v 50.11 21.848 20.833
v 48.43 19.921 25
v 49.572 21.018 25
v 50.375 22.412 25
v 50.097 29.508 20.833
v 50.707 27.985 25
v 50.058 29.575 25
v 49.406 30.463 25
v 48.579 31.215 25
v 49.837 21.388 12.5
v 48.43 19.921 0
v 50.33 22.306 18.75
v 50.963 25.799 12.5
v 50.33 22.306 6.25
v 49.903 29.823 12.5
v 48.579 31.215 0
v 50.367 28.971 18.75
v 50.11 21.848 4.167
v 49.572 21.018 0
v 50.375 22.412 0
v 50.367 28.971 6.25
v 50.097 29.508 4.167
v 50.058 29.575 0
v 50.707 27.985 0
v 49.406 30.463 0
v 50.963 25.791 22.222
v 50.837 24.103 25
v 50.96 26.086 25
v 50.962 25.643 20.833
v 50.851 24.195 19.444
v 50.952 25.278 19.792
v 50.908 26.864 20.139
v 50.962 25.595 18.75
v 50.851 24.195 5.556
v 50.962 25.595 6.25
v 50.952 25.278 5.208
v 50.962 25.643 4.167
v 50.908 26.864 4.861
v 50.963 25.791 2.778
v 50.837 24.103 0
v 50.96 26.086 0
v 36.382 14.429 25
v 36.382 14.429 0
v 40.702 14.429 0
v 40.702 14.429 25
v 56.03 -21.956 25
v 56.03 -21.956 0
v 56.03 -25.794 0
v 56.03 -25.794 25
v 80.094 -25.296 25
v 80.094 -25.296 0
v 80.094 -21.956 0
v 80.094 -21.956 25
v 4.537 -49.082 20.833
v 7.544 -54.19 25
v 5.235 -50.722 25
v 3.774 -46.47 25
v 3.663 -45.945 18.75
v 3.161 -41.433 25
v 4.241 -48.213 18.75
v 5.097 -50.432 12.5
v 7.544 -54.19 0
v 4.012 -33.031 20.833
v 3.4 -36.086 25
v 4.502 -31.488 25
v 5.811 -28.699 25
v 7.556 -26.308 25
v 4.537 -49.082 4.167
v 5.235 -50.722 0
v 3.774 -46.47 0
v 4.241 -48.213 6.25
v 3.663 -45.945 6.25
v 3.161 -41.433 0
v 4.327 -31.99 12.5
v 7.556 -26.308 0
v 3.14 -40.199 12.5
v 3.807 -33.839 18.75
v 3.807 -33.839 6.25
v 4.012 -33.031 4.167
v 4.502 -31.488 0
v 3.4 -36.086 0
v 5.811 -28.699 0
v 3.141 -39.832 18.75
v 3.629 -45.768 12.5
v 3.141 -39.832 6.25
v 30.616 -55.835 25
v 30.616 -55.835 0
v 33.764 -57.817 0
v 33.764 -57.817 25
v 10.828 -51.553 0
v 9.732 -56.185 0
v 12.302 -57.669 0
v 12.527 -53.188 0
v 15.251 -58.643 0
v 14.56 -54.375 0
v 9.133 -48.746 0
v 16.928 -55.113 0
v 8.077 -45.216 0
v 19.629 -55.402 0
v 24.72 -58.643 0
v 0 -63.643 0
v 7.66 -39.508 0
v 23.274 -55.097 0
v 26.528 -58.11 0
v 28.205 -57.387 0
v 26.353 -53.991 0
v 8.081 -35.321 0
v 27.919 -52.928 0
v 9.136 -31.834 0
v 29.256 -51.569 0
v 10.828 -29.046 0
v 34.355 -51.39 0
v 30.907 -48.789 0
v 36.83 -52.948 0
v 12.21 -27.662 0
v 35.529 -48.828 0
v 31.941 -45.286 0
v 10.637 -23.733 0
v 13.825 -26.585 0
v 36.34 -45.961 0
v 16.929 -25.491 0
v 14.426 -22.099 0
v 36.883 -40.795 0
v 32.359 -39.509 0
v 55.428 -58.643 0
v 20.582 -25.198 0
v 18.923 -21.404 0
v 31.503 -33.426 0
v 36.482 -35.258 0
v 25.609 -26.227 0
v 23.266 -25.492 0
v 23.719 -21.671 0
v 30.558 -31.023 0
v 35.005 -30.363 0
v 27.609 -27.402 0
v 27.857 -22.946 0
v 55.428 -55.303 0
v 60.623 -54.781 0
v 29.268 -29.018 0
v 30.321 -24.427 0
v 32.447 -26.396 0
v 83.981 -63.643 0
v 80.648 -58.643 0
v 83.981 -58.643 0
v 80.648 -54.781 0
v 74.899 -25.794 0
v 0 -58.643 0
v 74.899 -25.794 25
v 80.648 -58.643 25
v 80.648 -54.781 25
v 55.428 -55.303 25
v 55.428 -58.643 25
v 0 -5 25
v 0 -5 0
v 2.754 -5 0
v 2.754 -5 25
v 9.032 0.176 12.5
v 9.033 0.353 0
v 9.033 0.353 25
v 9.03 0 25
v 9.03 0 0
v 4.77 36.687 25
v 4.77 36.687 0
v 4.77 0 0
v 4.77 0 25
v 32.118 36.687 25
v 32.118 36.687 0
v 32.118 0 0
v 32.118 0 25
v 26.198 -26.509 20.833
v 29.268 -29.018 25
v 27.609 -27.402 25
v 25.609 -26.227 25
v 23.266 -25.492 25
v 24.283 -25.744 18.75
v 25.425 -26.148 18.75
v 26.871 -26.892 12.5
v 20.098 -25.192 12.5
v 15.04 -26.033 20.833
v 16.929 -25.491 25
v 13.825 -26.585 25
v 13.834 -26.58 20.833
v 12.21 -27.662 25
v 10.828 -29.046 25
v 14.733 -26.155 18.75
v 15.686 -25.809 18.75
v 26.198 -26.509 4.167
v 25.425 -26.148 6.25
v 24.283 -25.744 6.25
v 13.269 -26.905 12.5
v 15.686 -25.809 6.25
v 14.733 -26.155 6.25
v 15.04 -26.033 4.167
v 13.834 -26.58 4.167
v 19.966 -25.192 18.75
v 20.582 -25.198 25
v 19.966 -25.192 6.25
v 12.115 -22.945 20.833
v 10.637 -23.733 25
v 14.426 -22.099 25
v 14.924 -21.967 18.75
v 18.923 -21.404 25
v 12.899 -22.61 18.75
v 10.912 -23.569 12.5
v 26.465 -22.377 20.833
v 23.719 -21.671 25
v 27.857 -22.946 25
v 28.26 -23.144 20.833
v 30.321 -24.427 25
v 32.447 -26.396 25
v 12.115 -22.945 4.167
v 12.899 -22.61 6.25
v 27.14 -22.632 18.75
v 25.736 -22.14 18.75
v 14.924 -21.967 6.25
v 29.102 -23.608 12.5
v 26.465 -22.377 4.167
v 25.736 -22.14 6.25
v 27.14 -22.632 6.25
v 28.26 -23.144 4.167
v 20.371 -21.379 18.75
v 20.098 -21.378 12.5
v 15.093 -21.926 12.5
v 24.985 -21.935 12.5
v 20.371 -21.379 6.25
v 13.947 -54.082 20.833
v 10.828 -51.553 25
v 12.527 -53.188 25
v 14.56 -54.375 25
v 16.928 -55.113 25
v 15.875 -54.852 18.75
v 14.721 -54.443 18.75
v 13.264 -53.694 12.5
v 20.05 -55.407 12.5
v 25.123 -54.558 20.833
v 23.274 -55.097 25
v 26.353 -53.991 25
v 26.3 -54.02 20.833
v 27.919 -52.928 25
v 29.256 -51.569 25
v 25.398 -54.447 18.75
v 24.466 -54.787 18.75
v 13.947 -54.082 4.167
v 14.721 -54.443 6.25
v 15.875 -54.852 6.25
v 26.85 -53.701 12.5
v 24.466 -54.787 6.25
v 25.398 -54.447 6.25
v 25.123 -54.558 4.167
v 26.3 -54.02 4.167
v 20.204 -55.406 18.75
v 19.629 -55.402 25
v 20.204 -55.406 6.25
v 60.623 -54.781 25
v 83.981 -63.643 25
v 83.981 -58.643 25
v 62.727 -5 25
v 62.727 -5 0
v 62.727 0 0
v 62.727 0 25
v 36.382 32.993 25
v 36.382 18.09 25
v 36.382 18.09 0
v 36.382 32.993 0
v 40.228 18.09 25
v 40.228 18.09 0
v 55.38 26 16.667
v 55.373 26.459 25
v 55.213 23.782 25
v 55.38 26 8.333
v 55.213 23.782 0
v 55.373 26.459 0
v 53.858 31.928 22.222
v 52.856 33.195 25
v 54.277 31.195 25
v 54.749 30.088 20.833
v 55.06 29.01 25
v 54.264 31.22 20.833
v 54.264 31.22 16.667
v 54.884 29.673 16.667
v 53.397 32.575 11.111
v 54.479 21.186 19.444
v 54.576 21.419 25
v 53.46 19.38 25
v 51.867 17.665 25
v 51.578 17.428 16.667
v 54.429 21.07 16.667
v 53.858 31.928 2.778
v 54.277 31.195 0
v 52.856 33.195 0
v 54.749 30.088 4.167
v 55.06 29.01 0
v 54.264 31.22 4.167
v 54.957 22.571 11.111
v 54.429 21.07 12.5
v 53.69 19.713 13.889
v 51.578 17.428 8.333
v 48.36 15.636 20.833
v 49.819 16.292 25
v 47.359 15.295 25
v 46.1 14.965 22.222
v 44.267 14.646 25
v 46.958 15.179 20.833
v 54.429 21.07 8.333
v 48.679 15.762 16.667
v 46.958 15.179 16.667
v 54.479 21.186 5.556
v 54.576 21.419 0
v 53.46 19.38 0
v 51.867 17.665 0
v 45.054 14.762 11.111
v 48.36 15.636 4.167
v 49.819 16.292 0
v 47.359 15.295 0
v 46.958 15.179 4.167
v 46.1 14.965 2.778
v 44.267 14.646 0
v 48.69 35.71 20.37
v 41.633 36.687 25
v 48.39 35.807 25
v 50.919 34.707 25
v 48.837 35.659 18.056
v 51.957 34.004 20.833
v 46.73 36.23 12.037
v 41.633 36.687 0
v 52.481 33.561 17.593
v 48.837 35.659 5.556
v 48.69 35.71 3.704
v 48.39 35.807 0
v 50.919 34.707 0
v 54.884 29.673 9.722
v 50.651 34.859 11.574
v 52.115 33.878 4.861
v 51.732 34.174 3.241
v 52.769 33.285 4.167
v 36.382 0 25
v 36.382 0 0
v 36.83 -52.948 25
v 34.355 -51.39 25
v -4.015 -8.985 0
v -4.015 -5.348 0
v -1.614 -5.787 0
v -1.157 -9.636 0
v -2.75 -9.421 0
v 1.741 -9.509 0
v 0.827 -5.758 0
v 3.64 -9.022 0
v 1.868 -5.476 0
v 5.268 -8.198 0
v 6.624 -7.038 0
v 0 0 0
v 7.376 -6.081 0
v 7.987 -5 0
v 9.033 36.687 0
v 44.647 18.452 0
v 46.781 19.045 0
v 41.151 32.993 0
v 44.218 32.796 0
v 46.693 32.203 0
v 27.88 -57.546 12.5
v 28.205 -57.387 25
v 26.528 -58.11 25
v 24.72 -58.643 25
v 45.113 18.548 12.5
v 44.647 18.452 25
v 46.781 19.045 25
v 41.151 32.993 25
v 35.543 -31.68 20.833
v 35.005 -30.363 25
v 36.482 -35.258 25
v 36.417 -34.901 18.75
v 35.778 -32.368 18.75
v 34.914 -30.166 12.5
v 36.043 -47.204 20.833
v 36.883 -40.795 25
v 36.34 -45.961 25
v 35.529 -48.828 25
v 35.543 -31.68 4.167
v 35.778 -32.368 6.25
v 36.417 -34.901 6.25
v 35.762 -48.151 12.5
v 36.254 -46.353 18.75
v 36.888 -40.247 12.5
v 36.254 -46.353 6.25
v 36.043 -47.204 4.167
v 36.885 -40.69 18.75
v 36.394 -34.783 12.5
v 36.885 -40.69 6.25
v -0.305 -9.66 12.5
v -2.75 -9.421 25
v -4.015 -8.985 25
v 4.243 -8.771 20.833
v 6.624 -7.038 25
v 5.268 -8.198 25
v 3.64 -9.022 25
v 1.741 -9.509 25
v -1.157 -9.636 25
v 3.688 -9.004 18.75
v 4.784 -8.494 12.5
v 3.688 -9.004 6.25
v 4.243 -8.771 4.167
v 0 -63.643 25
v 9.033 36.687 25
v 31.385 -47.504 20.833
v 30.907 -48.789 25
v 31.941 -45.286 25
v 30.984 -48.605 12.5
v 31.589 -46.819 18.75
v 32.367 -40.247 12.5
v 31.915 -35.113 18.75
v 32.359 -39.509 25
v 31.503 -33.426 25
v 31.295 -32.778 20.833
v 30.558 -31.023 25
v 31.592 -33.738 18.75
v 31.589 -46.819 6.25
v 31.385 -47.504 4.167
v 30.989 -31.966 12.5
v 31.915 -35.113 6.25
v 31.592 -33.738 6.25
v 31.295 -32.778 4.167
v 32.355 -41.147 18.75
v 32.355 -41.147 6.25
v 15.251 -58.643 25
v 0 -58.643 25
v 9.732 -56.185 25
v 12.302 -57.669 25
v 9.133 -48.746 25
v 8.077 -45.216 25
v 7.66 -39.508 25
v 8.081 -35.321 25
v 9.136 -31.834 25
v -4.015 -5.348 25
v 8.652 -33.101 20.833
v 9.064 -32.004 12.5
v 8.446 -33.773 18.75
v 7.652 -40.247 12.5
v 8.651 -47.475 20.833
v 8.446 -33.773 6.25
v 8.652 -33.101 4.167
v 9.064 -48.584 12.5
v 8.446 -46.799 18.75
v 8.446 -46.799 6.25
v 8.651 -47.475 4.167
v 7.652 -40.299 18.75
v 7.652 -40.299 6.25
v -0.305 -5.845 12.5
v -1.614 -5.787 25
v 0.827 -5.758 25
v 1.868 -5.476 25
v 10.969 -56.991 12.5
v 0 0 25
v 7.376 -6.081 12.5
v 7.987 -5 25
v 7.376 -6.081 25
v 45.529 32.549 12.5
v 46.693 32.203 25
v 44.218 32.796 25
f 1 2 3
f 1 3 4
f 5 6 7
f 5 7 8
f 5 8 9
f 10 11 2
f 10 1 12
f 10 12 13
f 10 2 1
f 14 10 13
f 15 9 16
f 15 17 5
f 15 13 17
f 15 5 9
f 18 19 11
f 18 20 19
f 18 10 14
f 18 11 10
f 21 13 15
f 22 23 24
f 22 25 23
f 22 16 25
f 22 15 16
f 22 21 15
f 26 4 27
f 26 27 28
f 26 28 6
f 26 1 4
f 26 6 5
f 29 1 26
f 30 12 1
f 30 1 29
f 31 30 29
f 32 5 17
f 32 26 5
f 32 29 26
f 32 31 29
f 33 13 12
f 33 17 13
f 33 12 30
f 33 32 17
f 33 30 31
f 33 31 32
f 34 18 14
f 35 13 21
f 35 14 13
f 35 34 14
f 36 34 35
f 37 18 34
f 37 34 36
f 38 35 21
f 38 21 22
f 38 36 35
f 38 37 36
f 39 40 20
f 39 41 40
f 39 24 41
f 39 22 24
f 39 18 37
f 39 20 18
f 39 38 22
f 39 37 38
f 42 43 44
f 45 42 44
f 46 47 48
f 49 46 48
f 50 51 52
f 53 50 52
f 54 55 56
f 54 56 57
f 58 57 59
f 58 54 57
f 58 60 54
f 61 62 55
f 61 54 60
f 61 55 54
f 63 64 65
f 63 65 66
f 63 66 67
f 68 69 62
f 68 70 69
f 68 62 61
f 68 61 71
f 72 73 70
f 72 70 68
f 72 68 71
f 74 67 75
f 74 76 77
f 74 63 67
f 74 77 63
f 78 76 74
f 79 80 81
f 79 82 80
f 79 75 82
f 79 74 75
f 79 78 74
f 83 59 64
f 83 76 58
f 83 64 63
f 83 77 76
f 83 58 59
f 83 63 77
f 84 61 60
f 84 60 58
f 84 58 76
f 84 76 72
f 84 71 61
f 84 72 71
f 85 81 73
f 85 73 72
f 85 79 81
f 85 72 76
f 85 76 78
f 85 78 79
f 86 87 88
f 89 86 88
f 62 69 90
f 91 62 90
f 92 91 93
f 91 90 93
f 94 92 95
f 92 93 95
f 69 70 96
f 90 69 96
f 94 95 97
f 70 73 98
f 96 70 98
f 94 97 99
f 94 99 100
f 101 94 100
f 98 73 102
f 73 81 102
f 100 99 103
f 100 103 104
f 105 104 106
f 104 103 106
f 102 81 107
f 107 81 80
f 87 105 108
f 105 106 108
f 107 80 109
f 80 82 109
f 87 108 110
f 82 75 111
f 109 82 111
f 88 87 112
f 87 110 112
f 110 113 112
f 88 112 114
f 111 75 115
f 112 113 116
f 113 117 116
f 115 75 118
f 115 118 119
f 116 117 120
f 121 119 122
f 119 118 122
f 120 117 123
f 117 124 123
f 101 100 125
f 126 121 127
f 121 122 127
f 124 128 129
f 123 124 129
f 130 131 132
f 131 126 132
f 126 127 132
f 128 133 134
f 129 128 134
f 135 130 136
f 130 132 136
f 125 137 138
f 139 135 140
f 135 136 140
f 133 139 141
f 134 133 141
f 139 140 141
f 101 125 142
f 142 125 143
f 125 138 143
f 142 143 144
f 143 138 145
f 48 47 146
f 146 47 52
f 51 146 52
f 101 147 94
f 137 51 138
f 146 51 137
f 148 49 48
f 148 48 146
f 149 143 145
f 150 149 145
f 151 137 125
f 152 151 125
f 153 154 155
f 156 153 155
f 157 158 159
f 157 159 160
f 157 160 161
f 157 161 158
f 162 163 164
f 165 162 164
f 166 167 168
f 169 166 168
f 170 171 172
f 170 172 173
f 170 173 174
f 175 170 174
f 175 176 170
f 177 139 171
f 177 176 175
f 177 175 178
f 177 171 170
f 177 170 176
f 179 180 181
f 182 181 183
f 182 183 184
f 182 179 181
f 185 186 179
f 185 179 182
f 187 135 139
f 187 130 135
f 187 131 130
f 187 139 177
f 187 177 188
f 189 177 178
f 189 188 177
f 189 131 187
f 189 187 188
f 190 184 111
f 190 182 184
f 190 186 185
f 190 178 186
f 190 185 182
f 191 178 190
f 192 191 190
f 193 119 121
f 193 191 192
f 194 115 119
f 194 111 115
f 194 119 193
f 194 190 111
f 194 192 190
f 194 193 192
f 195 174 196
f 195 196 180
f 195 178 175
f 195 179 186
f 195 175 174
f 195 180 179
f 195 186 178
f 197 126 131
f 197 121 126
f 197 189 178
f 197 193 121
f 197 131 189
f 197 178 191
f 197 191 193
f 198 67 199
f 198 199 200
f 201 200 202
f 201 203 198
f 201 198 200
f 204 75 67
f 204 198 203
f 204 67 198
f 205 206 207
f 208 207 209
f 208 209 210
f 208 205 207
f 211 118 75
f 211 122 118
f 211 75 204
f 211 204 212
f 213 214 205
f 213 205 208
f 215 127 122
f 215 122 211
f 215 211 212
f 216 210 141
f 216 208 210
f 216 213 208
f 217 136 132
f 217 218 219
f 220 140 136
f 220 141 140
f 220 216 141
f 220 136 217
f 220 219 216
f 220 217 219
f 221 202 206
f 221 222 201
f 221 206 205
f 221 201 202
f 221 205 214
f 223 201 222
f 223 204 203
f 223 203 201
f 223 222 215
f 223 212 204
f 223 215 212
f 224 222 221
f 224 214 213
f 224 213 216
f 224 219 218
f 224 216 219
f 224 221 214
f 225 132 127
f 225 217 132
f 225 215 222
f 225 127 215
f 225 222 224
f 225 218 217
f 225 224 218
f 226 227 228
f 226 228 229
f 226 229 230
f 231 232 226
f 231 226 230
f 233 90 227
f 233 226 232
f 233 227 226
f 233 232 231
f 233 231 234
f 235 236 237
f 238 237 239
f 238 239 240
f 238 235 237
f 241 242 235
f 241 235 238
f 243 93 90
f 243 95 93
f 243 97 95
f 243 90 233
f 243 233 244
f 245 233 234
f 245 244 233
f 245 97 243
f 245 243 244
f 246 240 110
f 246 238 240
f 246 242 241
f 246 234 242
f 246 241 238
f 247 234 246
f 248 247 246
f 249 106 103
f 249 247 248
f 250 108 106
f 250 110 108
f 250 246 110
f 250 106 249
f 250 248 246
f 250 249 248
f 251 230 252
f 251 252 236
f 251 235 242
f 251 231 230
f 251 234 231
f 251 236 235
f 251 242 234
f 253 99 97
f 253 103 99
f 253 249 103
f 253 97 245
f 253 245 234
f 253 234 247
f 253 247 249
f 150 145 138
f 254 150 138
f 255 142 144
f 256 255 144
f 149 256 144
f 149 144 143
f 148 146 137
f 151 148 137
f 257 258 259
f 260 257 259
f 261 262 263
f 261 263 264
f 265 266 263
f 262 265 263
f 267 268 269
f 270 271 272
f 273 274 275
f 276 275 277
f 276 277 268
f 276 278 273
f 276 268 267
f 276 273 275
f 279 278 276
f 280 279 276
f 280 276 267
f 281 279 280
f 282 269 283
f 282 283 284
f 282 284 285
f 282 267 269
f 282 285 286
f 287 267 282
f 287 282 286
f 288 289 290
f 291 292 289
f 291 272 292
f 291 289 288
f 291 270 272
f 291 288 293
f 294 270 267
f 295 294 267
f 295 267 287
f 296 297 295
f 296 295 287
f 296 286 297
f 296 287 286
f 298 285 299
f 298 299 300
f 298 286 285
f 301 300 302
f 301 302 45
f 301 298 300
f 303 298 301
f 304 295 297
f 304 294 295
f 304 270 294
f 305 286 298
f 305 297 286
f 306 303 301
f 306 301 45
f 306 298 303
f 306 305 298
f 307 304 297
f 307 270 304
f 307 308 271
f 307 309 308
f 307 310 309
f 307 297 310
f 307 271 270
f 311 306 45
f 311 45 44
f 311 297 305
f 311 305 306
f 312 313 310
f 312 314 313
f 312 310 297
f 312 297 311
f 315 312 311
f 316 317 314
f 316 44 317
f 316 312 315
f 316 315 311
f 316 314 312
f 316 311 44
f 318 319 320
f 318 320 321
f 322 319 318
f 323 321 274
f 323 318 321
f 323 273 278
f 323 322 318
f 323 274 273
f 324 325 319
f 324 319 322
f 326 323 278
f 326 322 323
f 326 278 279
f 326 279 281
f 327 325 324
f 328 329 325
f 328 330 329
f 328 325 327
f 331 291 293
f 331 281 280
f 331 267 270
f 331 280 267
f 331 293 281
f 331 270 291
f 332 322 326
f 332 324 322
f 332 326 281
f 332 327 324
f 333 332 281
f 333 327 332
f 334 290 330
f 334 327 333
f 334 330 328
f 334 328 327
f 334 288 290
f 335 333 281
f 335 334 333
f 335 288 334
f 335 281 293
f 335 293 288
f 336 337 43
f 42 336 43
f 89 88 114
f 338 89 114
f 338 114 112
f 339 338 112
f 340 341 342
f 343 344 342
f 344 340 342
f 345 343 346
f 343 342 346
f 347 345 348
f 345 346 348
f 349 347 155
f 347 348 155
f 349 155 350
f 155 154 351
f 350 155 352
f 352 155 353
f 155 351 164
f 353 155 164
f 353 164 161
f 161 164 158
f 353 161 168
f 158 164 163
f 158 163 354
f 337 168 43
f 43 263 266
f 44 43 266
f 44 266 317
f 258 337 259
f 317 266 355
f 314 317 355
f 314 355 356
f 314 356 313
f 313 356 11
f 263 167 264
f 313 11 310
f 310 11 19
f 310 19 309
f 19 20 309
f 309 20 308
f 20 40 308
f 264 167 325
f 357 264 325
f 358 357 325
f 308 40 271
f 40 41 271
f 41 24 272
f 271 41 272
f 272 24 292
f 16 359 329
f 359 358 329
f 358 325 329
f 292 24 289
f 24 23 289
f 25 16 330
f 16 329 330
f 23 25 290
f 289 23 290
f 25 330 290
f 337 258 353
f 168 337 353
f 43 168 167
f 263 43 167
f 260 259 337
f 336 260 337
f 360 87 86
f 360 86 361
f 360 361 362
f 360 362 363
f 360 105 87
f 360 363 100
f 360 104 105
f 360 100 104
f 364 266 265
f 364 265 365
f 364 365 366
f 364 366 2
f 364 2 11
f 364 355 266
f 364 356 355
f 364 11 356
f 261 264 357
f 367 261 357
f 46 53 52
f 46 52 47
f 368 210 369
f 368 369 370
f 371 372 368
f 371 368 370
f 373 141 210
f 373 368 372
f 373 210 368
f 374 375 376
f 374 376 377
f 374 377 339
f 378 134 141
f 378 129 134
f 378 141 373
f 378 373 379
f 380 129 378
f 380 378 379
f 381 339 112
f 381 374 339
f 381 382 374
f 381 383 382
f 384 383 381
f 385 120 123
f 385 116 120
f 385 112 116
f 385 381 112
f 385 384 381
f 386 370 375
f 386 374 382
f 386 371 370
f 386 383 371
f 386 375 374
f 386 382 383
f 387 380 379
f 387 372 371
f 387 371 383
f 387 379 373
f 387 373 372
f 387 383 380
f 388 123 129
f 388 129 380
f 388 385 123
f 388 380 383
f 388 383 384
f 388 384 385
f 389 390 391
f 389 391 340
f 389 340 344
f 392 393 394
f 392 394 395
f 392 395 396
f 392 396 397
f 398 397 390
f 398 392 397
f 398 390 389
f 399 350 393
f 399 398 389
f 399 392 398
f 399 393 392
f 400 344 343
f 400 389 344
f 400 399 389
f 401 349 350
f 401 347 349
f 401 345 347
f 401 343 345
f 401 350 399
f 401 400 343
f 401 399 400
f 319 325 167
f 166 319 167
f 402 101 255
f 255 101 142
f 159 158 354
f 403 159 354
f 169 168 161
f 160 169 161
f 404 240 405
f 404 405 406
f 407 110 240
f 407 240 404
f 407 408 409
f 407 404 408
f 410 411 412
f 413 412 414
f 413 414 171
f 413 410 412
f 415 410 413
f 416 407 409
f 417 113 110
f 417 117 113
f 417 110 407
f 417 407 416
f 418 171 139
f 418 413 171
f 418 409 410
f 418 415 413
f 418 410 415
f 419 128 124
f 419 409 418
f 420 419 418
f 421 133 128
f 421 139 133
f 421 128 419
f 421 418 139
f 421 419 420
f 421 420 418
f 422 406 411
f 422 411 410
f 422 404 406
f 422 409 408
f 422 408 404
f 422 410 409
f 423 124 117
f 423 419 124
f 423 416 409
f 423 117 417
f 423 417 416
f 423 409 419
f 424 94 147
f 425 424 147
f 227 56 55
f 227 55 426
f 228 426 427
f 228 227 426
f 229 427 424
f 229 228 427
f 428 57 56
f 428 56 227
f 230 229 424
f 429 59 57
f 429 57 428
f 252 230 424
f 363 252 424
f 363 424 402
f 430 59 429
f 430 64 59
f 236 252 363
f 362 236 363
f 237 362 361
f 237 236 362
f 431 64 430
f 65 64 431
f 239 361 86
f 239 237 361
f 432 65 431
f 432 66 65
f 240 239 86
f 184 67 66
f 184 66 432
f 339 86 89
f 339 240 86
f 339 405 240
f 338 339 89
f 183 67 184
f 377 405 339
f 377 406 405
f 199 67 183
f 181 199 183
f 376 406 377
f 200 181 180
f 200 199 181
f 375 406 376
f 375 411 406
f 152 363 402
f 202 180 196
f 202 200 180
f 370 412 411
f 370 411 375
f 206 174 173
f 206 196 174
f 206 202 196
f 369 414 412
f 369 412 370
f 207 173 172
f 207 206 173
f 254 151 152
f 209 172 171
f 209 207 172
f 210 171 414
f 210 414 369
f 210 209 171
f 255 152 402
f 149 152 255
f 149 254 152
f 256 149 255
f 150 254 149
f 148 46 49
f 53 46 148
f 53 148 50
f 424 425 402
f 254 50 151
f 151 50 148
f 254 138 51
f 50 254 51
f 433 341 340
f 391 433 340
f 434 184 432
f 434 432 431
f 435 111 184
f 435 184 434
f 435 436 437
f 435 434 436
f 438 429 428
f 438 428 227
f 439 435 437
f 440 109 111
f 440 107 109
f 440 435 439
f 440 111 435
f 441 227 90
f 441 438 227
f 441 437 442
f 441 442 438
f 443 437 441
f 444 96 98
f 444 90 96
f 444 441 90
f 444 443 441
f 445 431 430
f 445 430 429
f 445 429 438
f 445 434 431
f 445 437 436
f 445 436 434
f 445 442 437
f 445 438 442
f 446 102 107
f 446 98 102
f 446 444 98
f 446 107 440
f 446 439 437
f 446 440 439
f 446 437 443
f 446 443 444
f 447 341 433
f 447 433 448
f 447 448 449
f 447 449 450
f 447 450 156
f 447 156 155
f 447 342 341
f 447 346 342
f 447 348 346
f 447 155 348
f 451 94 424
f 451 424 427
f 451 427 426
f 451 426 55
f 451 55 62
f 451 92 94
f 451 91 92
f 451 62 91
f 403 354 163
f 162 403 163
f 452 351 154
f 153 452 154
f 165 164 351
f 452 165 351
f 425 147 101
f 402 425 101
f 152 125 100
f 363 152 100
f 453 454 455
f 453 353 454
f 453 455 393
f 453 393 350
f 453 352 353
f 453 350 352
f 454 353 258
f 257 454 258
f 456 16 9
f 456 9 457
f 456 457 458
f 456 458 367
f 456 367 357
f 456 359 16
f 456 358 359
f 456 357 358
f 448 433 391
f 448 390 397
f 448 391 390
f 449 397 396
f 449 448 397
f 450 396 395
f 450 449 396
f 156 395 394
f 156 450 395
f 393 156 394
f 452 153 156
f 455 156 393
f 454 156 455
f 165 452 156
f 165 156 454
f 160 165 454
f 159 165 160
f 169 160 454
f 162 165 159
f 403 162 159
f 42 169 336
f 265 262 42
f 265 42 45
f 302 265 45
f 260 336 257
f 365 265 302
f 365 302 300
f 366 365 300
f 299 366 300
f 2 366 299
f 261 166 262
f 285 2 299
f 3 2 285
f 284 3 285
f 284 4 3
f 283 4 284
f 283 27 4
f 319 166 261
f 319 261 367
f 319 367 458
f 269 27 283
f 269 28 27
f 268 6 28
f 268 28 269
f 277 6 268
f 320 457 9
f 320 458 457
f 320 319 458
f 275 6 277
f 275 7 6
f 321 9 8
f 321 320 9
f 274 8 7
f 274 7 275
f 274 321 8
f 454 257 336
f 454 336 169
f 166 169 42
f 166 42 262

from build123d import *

# Parameters (mm, degrees)
F1_DEPTH = 25


with BuildPart() as f1:
    # F0 (on Top) → F1 (new body)
    with BuildSketch(Plane.XY):
        with BuildLine():
            Line((4.76953125, 0), (0, 0))
            Line((0, 0), (0, -5))
            Line((0, -5), (2.7536867479, -5))
            add(Edge.make_bspline(
                [(2.7536867479, -5), (3.1528031854, -4.7172538817), (3.4767795139, -4.3399522569)],
                knots=[0.7493901424, 0.7493901424, 0.7493901424, 1, 1, 1], degree=2))
            add(Edge.make_bspline(
                [(3.4767795139, -4.3399522569), (4.76953125, -2.8344184028), (4.76953125, 0)],
                knots=[0, 0, 0, 1, 1, 1], degree=2))
        make_face()
        with BuildLine():
            Line((4.76953125, 36.6868489583), (4.76953125, 0))
            Line((4.76953125, 0), (9.0298425084, 0))
            add(Edge.make_bspline(
                [(9.033203125, 0.3532986111), (9.033203125, 0.1751510307), (9.0298425084, 0)],
                knots=[0, 0, 0, 0.0373511717, 0.0373511717, 0.0373511717], degree=2))
            Line((9.033203125, 0.3532986111), (9.033203125, 36.6868489583))
            Line((9.033203125, 36.6868489583), (4.76953125, 36.6868489583))
        make_face()
        with BuildLine():
            Line((9.0298425084, 0), (4.76953125, 0))
            add(Edge.make_bspline(
                [(3.4767795139, -4.3399522569), (4.76953125, -2.8344184028), (4.76953125, 0)],
                knots=[0, 0, 0, 1, 1, 1], degree=2))
            add(Edge.make_bspline(
                [(2.7536867479, -5), (3.1528031854, -4.7172538817), (3.4767795139, -4.3399522569)],
                knots=[0.7493901424, 0.7493901424, 0.7493901424, 1, 1, 1], degree=2))
            Line((2.7536867479, -5), (7.987156225, -5))
            add(Edge.make_bspline(
                [(9.0298425084, 0), (8.9739126319, -2.9149934948), (7.987156225, -5)],
                knots=[0.0373511717, 0.0373511717, 0.0373511717, 0.6589771022, 0.6589771022, 0.6589771022], degree=2))
        make_face()
        with BuildLine():
            Line((32.1180555556, 0), (9.0298425084, 0))
            add(Edge.make_bspline(
                [(9.0298425084, 0), (8.9739126319, -2.9149934948), (7.987156225, -5)],
                knots=[0.0373511717, 0.0373511717, 0.0373511717, 0.6589771022, 0.6589771022, 0.6589771022], degree=2))
            Line((7.987156225, -5), (62.7265625, -5))
            Line((62.7265625, -5), (62.7265625, 0))
            Line((62.7265625, 0), (36.3817274306, 0))
            Line((36.3817274306, 0), (32.1180555556, 0))
        make_face()
        with BuildLine():
            Line((7.987156225, -5), (2.7536867479, -5))
            add(Edge.make_bspline(
                [(-0.3051215278, -5.8454861111), (1.5602224249, -5.8454861111), (2.7536867479, -5)],
                knots=[0, 0, 0, 0.7493901424, 0.7493901424, 0.7493901424], degree=2))
            add(Edge.make_bspline(
                [(-4.0147569444, -5.34765625), (-2.2322048611, -5.8454861111), (-0.3051215278, -5.8454861111)],
                knots=[0, 0, 0, 1, 1, 1], degree=2))
            Line((-4.0147569444, -5.34765625), (-4.0147569444, -8.9850260417))
            add(Edge.make_bspline(
                [(-0.3051215278, -9.6595052083), (-2.6577690972, -9.6595052083), (-4.0147569444, -8.9850260417)],
                knots=[0, 0, 0, 1, 1, 1], degree=2))
            add(Edge.make_bspline(
                [(6.6243489583, -7.0378689236), (4.2154947917, -9.6595052083), (-0.3051215278, -9.6595052083)],
                knots=[0, 0, 0, 1, 1, 1], degree=2))
            add(Edge.make_bspline(
                [(7.987156225, -5), (7.4458233867, -6.1438309207), (6.6243489583, -7.0378689236)],
                knots=[0.6589771022, 0.6589771022, 0.6589771022, 1, 1, 1], degree=2))
        make_face()
        with BuildLine():
            Line((32.1180555556, 36.6868489583), (32.1180555556, 0))
            Line((32.1180555556, 0), (36.3817274306, 0))
            Line((36.3817274306, 0), (36.3817274306, 14.4290364583))
            Line((36.3817274306, 14.4290364583), (40.7016059028, 14.4290364583))
            add(Edge.make_bspline(
                [(51.5775824653, 17.4280598958), (47.7756076389, 14.4290364583), (40.7016059028, 14.4290364583)],
                knots=[0, 0, 0, 1, 1, 1], degree=2))
            add(Edge.make_bspline(
                [(55.3795572917, 25.9995659722), (55.3795572917, 20.4270833333), (51.5775824653, 17.4280598958)],
                knots=[0, 0, 0, 1, 1, 1], degree=2))
            add(Edge.make_bspline(
                [(41.6330295139, 36.6868489583), (55.3795572917, 36.6868489583), (55.3795572917, 25.9995659722)],
                knots=[0, 0, 0, 1, 1, 1], degree=2))
            Line((41.6330295139, 36.6868489583), (32.1180555556, 36.6868489583))
        make_face()
        with BuildLine():
            Line((40.2278645833, 18.0904947917), (36.3817274306, 18.0904947917))
            Line((36.3817274306, 18.0904947917), (36.3817274306, 32.9932725694))
            Line((36.3817274306, 32.9932725694), (41.1512586806, 32.9932725694))
            add(Edge.make_bspline(
                [(48.5785590278, 31.2147352431), (46.1937934028, 32.9932725694), (41.1512586806, 32.9932725694)],
                knots=[0, 0, 0, 1, 1, 1], degree=2))
            add(Edge.make_bspline(
                [(50.9633246528, 25.798828125), (50.9633246528, 29.4361979167), (48.5785590278, 31.2147352431)],
                knots=[0, 0, 0, 1, 1, 1], degree=2))
            add(Edge.make_bspline(
                [(48.4300130208, 19.9212239583), (50.9633246528, 21.751953125), (50.9633246528, 25.798828125)],
                knots=[0, 0, 0, 1, 1, 1], degree=2))
            add(Edge.make_bspline(
                [(40.2278645833, 18.0904947917), (45.8967013889, 18.0904947917), (48.4300130208, 19.9212239583)],
                knots=[0, 0, 0, 1, 1, 1], degree=2))
        make_face(mode=Mode.SUBTRACT)
        Polygon((55.427734375, -55.3025330059), (55.427734375, -58.6428107837), (80.6484375, -58.6428107837), (80.6484375, -54.7806146031), (60.6228298611, -54.7806146031), (80.0944010417, -25.2962396031), (80.0944010417, -21.9559618254), (56.0299479167, -21.9559618254), (56.0299479167, -25.7940694642), (74.8993055556, -25.7940694642), align=None)
        with BuildLine():
            Line((80.6484375, -58.6428107837), (55.427734375, -58.6428107837))
            Line((55.427734375, -58.6428107837), (24.7202634503, -58.6428107837))
            add(Edge.make_bspline(
                [(24.7202634503, -58.6428107837), (22.5588312474, -59.1486701587), (20.0496961806, -59.1486701587)],
                knots=[0.6833950988, 0.6833950988, 0.6833950988, 1, 1, 1], degree=2))
            add(Edge.make_bspline(
                [(20.0496961806, -59.1486701587), (17.4618872121, -59.1486701587), (15.2513223605, -58.6428107837)],
                knots=[0, 0, 0, 0.319412416, 0.319412416, 0.319412416], degree=2))
            Line((15.2513223605, -58.6428107837), (0, -58.6428107837))
            Line((0, -58.6428107837), (0, -63.6428107837))
            Line((0, -63.6428107837), (83.9806857639, -63.6428107837))
            Line((83.9806857639, -63.6428107837), (83.9806857639, -58.6428107837))
            Line((83.9806857639, -58.6428107837), (80.6484375, -58.6428107837))
        make_face()
        with BuildLine():
            add(Edge.make_bspline(
                [(24.7202634503, -58.6428107837), (22.5588312474, -59.1486701587), (20.0496961806, -59.1486701587)],
                knots=[0.6833950988, 0.6833950988, 0.6833950988, 1, 1, 1], degree=2))
            Line((24.7202634503, -58.6428107837), (15.2513223605, -58.6428107837))
            add(Edge.make_bspline(
                [(20.0496961806, -59.1486701587), (17.4618872121, -59.1486701587), (15.2513223605, -58.6428107837)],
                knots=[0, 0, 0, 0.319412416, 0.319412416, 0.319412416], degree=2))
        make_face()
        with BuildLine():
            Line((15.2513223605, -58.6428107837), (24.7202634503, -58.6428107837))
            add(Edge.make_bspline(
                [(30.616204684, -55.8347158125), (28.0910580539, -57.8539134733), (24.7202634503, -58.6428107837)],
                knots=[0.1896437375, 0.1896437375, 0.1896437375, 0.6833950988, 0.6833950988, 0.6833950988], degree=2))
            Line((30.616204684, -55.8347158125), (30.5317305028, -55.7815283537))
            Line((30.5317305028, -55.7815283537), (33.7639600039, -51.0173855737))
            Line((33.7639600039, -51.0173855737), (34.355158139, -51.3896215167))
            add(Edge.make_bspline(
                [(36.8875868056, -40.2471944642), (36.8875868056, -46.8872754051), (34.355158139, -51.3896215167)],
                knots=[0, 0, 0, 0.7538370735, 0.7538370735, 0.7538370735], degree=2))
            add(Edge.make_bspline(
                [(32.447265625, -26.3962830059), (36.8875868056, -31.4147291865), (36.8875868056, -40.2471944642)],
                knots=[0, 0, 0, 1, 1, 1], degree=2))
            add(Edge.make_bspline(
                [(20.0978732639, -21.3778368254), (28.0069444444, -21.3778368254), (32.447265625, -26.3962830059)],
                knots=[0, 0, 0, 1, 1, 1], degree=2))
            add(Edge.make_bspline(
                [(7.5557725694, -26.3079583531), (11.9720052083, -21.3778368254), (20.0978732639, -21.3778368254)],
                knots=[0, 0, 0, 1, 1, 1], degree=2))
            add(Edge.make_bspline(
                [(3.1395399306, -40.1990173809), (3.1395399306, -31.2380798809), (7.5557725694, -26.3079583531)],
                knots=[0, 0, 0, 1, 1, 1], degree=2))
            add(Edge.make_bspline(
                [(7.5437282986, -54.1904453323), (3.1395399306, -49.2322205059), (3.1395399306, -40.1990173809)],
                knots=[0, 0, 0, 1, 1, 1], degree=2))
            add(Edge.make_bspline(
                [(15.2513223605, -58.6428107837), (10.5411642195, -57.5649515878), (7.5437282986, -54.1904453323)],
                knots=[0.319412416, 0.319412416, 0.319412416, 1, 1, 1], degree=2))
        make_face()
        with BuildLine():
            add(Edge.make_bspline(
                [(7.6521267361, -40.2471944642), (7.6521267361, -47.6985833531), (10.8277994792, -51.5527500198)],
                knots=[0, 0, 0, 1, 1, 1], degree=2))
            add(Edge.make_bspline(
                [(10.8277994792, -29.0460225892), (7.6521267361, -32.9001892559), (7.6521267361, -40.2471944642)],
                knots=[0, 0, 0, 1, 1, 1], degree=2))
            add(Edge.make_bspline(
                [(20.0978732639, -25.1918559226), (14.0034722222, -25.1918559226), (10.8277994792, -29.0460225892)],
                knots=[0, 0, 0, 1, 1, 1], degree=2))
            add(Edge.make_bspline(
                [(29.267578125, -29.0179192906), (26.1681857639, -25.1918559226), (20.0978732639, -25.1918559226)],
                knots=[0, 0, 0, 1, 1, 1], degree=2))
            add(Edge.make_bspline(
                [(32.3669704861, -40.2471944642), (32.3669704861, -32.8439826587), (29.267578125, -29.0179192906)],
                knots=[0, 0, 0, 1, 1, 1], degree=2))
            add(Edge.make_bspline(
                [(29.2555338542, -51.5688090476), (32.3669704861, -47.7307014087), (32.3669704861, -40.2471944642)],
                knots=[0, 0, 0, 1, 1, 1], degree=2))
            add(Edge.make_bspline(
                [(20.0496961806, -55.4069166865), (26.1440972222, -55.4069166865), (29.2555338542, -51.5688090476)],
                knots=[0, 0, 0, 1, 1, 1], degree=2))
            add(Edge.make_bspline(
                [(10.8277994792, -51.5527500198), (14.0034722222, -55.4069166865), (20.0496961806, -55.4069166865)],
                knots=[0, 0, 0, 1, 1, 1], degree=2))
        make_face(mode=Mode.SUBTRACT)
        with BuildLine():
            add(Edge.make_bspline(
                [(32.4312065972, -54.1021206795), (31.586081999, -55.059167184), (30.616204684, -55.8347158125)],
                knots=[0, 0, 0, 0.1896437375, 0.1896437375, 0.1896437375], degree=2))
            Line((30.616204684, -55.8347158125), (33.7639600039, -57.8166362555))
            Line((33.7639600039, -57.8166362555), (36.8296342213, -52.9476253114))
            Line((36.8296342213, -52.9476253114), (34.355158139, -51.3896215167))
            add(Edge.make_bspline(
                [(34.355158139, -51.3896215167), (33.528202191, -52.8598472909), (32.4312065972, -54.1021206795)],
                knots=[0.7538370735, 0.7538370735, 0.7538370735, 1, 1, 1], degree=2))
        make_face()
        with BuildLine():
            Line((30.5317305028, -55.7815283537), (30.616204684, -55.8347158125))
            add(Edge.make_bspline(
                [(32.4312065972, -54.1021206795), (31.586081999, -55.059167184), (30.616204684, -55.8347158125)],
                knots=[0, 0, 0, 0.1896437375, 0.1896437375, 0.1896437375], degree=2))
            add(Edge.make_bspline(
                [(34.355158139, -51.3896215167), (33.528202191, -52.8598472909), (32.4312065972, -54.1021206795)],
                knots=[0.7538370735, 0.7538370735, 0.7538370735, 1, 1, 1], degree=2))
            Line((34.355158139, -51.3896215167), (33.7639600039, -51.0173855737))
            Line((33.7639600039, -51.0173855737), (30.5317305028, -55.7815283537))
        make_face()
    extrude(amount=F1_DEPTH)


solid = f1.part
